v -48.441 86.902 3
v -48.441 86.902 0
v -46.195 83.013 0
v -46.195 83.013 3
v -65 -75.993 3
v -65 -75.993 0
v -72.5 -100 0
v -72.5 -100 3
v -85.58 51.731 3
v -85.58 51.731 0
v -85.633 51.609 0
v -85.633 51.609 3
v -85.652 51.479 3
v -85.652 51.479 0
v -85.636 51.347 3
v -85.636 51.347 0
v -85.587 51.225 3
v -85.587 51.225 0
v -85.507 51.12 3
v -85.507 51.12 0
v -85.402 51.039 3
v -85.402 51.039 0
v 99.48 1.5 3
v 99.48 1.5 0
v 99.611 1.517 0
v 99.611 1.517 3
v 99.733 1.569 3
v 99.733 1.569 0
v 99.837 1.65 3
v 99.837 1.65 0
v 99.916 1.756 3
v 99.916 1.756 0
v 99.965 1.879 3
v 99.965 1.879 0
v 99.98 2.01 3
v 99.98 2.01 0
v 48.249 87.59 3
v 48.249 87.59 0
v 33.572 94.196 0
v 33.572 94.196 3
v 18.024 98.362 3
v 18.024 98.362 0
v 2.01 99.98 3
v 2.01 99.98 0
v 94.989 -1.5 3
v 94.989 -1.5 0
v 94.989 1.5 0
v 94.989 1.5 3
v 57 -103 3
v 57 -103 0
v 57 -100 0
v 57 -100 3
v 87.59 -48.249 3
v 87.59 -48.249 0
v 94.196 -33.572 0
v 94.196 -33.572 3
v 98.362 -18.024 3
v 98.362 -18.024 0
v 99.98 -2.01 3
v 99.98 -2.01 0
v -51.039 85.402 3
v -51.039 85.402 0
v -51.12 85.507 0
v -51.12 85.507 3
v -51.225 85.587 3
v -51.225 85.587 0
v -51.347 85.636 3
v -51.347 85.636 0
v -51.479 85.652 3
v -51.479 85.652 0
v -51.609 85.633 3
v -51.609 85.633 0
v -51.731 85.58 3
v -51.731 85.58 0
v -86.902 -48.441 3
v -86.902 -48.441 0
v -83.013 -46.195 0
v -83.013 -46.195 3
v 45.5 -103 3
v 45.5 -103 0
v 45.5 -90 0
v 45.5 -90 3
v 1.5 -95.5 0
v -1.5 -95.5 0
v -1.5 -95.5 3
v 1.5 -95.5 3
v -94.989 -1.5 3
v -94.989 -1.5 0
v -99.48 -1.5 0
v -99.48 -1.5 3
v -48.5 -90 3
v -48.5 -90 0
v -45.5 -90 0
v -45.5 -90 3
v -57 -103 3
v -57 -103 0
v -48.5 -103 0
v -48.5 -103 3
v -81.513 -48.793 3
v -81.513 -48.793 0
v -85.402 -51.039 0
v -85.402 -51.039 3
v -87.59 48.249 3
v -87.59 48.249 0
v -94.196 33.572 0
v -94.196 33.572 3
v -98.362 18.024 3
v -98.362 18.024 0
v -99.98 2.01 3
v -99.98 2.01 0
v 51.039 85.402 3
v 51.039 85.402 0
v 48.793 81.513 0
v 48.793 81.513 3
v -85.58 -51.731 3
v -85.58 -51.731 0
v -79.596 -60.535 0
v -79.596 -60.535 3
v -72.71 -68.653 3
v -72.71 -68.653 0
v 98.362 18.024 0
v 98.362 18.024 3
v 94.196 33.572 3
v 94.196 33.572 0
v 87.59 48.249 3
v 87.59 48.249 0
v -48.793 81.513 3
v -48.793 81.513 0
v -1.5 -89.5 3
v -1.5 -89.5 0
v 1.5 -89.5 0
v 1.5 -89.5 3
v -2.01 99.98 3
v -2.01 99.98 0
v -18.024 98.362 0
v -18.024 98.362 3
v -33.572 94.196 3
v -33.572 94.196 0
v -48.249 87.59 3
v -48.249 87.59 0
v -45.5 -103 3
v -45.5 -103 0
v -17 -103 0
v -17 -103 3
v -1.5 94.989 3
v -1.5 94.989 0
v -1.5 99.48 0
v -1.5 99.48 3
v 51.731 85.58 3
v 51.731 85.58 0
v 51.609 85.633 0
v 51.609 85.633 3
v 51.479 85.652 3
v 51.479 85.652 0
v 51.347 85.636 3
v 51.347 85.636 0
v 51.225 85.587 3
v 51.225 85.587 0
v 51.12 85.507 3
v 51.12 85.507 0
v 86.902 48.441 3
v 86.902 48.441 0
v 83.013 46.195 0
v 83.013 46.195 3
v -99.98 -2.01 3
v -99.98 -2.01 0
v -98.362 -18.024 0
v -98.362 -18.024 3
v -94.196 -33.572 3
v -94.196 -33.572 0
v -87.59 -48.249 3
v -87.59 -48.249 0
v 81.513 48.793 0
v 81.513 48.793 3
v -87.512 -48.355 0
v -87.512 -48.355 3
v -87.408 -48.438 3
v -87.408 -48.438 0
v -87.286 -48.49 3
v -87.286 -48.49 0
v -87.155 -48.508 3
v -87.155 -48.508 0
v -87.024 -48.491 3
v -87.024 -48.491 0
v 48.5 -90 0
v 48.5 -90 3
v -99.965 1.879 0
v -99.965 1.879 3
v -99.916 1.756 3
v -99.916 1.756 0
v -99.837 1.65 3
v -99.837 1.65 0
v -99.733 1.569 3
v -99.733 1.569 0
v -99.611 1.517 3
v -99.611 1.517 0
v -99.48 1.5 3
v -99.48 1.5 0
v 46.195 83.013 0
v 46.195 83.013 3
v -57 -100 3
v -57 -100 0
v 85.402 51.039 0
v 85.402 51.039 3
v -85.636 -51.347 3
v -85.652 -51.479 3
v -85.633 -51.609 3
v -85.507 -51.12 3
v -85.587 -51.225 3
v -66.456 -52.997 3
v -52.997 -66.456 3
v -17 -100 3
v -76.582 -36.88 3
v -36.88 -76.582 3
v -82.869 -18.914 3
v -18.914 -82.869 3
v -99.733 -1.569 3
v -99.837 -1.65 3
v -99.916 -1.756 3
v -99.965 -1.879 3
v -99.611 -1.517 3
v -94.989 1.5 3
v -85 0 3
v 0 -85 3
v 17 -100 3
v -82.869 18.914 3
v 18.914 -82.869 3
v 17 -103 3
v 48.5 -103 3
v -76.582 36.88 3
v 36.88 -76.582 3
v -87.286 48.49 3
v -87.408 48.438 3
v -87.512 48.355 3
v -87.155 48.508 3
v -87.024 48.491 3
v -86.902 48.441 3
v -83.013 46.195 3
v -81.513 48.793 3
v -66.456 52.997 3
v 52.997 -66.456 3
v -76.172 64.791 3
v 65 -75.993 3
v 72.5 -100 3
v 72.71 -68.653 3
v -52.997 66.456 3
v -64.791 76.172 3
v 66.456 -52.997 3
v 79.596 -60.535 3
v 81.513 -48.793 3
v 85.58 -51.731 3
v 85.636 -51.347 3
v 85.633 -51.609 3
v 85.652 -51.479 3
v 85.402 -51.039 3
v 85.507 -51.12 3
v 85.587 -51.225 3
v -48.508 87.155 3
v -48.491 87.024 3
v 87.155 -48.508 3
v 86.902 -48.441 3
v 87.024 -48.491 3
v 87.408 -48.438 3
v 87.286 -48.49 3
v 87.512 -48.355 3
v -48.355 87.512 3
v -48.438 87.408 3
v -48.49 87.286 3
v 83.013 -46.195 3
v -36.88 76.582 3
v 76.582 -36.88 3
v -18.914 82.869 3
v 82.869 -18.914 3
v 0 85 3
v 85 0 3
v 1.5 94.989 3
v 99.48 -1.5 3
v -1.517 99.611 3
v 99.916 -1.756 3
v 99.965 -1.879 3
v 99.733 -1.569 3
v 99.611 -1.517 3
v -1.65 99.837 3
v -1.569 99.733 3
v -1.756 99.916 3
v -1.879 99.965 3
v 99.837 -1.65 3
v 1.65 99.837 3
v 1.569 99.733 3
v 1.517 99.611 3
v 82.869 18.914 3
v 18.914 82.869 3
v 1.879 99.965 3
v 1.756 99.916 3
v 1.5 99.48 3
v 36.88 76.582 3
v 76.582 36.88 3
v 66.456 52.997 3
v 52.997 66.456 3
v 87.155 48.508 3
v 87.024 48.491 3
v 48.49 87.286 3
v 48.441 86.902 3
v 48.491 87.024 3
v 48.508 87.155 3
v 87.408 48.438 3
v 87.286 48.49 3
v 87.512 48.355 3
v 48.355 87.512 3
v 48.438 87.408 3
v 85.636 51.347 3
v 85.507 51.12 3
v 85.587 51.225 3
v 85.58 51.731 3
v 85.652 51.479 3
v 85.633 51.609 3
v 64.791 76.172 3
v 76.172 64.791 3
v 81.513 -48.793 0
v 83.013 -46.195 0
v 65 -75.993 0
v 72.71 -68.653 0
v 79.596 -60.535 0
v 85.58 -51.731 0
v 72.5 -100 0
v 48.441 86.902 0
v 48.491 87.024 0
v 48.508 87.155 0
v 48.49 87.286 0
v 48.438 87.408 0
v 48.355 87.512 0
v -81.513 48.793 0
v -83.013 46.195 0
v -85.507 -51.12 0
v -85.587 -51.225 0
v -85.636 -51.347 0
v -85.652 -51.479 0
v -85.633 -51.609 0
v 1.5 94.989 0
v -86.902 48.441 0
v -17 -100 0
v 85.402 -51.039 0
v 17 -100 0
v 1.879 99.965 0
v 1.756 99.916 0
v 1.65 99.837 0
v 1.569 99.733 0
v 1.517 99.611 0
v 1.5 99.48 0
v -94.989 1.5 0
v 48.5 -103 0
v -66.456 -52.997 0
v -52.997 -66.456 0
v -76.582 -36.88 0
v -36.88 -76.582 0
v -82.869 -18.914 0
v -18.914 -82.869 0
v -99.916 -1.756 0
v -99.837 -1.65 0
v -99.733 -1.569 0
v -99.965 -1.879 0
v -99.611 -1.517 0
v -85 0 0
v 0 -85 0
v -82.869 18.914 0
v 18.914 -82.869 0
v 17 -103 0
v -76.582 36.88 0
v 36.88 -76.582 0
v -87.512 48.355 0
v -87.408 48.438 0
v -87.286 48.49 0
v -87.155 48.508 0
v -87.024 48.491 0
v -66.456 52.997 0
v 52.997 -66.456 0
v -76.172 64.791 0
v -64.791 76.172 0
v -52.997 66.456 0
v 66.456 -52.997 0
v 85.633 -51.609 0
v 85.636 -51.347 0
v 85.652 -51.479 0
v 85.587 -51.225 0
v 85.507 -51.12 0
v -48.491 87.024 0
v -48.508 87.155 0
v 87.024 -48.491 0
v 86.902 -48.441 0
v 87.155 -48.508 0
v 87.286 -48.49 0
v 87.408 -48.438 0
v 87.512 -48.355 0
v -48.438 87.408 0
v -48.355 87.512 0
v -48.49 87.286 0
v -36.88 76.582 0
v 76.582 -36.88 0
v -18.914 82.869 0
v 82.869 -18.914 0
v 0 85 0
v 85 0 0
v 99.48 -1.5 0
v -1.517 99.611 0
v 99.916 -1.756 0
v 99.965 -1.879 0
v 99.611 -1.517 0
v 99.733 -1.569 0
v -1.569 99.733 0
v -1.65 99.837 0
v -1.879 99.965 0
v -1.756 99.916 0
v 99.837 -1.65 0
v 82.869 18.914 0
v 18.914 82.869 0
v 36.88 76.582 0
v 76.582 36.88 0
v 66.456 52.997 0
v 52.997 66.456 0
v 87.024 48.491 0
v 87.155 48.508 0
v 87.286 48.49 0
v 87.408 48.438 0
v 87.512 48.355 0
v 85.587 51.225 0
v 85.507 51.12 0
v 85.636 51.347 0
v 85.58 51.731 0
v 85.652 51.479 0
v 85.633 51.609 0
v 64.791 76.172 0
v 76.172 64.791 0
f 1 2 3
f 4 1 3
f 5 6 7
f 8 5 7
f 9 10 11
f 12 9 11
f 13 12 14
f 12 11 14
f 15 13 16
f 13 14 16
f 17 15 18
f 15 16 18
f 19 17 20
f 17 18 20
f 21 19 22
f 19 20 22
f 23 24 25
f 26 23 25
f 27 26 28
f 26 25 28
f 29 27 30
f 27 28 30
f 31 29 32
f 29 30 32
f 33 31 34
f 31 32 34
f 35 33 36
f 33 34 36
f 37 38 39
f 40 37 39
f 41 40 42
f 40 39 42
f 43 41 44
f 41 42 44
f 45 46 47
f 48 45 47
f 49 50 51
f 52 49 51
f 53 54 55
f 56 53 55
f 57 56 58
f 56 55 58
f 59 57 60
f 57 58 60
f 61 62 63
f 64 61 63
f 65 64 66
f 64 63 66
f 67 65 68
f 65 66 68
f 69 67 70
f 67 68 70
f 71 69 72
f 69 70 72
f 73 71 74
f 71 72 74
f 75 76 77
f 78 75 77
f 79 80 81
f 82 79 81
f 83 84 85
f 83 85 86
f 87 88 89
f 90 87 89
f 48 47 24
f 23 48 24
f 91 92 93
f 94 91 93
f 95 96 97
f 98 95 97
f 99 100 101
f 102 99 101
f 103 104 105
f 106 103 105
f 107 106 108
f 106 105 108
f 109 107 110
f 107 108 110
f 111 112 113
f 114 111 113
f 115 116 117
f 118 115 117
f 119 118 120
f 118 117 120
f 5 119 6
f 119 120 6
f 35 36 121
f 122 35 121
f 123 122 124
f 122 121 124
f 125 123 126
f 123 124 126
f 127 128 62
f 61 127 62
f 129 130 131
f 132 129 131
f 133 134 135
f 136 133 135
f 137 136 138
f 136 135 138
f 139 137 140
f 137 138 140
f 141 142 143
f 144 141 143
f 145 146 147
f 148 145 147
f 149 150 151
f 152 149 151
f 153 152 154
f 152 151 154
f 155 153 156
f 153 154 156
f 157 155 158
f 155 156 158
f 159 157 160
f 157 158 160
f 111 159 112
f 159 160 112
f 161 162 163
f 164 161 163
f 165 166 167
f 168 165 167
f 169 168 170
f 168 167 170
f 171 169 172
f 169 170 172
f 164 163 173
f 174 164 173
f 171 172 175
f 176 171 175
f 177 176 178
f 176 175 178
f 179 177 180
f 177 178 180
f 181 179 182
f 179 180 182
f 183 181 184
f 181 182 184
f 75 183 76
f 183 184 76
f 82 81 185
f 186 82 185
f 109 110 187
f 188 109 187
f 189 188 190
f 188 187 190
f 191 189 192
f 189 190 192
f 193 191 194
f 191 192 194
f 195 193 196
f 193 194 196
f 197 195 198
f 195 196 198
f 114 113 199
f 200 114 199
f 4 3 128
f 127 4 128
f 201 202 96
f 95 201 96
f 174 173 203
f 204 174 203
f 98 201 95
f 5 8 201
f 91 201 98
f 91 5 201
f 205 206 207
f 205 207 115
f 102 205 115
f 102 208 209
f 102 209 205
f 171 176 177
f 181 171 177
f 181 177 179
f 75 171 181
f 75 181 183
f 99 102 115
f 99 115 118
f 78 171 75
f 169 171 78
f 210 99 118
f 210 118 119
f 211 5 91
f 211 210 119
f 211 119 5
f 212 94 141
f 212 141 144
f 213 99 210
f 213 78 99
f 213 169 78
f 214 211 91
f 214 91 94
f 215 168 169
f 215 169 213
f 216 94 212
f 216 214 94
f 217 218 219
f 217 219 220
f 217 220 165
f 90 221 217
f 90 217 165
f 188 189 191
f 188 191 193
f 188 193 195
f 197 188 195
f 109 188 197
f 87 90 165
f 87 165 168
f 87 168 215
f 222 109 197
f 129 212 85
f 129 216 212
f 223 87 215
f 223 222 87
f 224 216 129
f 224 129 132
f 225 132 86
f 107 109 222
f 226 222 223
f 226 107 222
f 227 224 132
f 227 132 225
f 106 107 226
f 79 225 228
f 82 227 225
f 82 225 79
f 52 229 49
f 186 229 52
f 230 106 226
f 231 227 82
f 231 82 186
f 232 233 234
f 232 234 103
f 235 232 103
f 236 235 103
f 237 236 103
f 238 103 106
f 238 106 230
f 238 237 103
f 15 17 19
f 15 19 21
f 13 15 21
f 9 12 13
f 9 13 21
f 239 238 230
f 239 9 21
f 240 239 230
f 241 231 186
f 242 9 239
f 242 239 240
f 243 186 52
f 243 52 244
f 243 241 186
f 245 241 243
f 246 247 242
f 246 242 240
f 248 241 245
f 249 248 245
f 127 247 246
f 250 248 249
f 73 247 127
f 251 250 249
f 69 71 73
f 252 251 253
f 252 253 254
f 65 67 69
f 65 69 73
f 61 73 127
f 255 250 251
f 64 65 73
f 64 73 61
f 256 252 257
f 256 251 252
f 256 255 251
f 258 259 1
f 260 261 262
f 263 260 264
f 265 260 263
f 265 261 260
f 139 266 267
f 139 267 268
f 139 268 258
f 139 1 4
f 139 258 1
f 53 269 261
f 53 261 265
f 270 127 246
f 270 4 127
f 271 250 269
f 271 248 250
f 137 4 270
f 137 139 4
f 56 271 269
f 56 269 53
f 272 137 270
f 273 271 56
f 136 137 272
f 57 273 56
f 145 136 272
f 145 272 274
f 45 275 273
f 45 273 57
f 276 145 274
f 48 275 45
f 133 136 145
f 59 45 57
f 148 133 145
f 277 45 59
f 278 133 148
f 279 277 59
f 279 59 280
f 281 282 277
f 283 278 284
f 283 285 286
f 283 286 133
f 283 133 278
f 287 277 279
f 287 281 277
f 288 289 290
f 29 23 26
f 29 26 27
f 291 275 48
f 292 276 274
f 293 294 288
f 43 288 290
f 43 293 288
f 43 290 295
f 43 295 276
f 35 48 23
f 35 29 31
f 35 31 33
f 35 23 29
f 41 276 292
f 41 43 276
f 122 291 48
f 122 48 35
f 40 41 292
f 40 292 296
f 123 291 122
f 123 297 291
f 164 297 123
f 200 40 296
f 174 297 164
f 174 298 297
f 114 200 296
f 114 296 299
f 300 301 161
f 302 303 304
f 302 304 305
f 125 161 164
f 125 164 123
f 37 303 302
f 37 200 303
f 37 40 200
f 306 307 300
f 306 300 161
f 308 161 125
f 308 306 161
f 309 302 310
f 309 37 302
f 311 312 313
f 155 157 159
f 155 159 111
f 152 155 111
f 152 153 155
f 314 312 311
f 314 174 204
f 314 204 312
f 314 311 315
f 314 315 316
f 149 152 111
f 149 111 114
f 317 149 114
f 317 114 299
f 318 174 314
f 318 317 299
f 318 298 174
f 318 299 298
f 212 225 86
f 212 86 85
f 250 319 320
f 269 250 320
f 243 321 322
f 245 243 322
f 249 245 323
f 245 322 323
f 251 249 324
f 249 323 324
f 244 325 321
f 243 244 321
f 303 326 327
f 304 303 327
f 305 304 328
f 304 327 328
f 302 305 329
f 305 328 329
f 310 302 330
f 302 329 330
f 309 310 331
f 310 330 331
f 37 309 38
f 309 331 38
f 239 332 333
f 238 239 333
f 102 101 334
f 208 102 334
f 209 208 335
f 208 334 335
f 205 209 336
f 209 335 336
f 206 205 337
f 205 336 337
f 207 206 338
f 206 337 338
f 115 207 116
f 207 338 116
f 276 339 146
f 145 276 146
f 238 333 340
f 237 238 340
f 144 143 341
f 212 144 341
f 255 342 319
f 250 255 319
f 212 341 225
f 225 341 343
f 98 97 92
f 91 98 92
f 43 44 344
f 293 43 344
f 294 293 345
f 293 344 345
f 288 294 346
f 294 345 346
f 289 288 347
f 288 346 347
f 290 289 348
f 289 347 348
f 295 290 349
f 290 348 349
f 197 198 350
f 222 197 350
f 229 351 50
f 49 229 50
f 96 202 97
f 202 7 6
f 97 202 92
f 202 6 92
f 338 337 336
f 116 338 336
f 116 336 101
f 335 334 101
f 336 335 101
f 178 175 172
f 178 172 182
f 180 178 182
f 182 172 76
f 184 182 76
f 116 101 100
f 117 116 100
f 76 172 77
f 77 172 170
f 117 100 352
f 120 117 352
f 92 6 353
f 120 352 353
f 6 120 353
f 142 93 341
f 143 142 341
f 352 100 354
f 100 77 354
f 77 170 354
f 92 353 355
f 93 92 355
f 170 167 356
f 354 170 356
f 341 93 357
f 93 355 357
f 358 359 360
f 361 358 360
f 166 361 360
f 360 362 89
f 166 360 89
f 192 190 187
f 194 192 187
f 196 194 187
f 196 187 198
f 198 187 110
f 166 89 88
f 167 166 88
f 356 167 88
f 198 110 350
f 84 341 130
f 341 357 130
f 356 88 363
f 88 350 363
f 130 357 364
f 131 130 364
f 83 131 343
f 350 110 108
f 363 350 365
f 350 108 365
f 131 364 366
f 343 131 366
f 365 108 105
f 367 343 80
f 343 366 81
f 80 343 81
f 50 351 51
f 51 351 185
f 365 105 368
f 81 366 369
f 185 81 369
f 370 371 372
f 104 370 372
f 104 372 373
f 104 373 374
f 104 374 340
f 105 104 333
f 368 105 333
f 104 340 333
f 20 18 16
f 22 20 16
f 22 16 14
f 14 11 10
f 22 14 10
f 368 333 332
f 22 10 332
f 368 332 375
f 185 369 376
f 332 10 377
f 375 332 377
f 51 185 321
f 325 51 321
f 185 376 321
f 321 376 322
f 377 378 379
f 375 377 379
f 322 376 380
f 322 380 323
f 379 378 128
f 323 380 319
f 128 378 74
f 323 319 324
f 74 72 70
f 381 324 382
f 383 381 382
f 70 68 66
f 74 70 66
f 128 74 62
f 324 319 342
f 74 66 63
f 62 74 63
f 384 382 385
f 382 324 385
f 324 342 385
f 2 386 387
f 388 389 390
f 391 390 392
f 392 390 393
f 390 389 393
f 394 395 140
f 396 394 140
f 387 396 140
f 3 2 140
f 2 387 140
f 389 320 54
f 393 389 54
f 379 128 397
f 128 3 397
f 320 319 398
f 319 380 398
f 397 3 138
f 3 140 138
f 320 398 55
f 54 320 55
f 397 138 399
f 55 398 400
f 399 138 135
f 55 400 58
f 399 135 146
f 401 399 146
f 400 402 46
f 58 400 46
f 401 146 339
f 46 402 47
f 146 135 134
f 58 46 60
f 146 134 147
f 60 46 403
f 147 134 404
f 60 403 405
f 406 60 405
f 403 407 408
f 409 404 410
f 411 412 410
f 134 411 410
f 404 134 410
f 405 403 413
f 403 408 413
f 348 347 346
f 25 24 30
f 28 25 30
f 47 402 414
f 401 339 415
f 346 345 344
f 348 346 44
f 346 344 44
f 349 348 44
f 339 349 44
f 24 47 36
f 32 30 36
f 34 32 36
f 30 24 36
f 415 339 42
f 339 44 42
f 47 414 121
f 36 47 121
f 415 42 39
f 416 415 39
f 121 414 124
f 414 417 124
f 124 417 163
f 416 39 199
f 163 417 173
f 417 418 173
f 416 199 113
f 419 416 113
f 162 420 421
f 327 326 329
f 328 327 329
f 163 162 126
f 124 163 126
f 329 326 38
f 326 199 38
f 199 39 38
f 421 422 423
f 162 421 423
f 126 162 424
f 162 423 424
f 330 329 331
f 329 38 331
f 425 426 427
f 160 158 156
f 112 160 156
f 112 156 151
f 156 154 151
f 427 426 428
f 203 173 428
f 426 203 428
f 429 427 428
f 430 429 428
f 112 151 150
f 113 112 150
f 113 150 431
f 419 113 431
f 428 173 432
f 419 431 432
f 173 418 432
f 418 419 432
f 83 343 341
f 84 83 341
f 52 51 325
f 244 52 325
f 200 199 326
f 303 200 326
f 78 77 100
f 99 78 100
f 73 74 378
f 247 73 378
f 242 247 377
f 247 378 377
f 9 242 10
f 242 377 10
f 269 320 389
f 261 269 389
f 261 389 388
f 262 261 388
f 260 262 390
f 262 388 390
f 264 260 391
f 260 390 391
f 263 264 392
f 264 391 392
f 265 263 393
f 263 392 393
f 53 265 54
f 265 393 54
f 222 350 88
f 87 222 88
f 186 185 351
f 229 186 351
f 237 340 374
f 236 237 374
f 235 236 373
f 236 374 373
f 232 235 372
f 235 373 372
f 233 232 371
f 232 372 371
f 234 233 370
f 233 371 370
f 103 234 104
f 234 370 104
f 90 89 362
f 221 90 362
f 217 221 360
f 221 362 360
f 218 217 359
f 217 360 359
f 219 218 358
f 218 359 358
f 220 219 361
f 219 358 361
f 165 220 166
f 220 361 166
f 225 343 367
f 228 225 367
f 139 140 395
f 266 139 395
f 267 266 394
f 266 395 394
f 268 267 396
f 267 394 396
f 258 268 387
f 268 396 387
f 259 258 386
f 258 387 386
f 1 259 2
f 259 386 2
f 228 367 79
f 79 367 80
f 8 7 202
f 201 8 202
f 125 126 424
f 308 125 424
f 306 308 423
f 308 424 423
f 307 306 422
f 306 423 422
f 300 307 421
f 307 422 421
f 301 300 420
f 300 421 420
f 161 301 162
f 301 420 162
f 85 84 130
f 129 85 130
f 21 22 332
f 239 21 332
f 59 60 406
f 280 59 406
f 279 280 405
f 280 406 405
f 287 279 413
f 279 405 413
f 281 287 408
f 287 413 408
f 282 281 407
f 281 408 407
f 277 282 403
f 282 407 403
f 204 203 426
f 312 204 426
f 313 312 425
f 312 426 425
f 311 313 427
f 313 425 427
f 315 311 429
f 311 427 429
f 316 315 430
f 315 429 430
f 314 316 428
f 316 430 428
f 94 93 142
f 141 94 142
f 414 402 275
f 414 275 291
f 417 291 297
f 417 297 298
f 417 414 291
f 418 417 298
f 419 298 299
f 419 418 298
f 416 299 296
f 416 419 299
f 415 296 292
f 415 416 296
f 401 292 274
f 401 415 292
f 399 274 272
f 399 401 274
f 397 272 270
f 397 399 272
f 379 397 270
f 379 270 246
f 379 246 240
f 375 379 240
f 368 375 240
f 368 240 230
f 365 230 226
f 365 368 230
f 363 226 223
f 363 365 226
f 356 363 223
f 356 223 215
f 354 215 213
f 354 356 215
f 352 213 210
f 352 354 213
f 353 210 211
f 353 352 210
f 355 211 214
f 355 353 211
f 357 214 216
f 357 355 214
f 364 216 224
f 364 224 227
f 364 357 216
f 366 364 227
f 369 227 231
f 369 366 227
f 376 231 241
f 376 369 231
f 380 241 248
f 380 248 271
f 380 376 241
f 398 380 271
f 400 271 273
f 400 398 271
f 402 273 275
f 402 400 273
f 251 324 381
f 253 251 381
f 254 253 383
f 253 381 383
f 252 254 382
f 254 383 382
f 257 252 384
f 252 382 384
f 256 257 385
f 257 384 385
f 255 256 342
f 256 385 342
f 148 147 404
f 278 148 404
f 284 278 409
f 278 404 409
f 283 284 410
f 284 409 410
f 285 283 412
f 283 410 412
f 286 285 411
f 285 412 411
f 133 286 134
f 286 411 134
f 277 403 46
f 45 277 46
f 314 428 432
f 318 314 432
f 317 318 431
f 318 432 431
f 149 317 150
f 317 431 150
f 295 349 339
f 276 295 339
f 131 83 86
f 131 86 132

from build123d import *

# Parameters (mm, degrees)
F0_W     = 3
F0_H     = 6
F0_R     = 85
F1_DEPTH = 3


with BuildPart() as f1:
    # F0 (on Top) → F1 (new body)
    with BuildSketch(Plane.XY):
        with BuildLine():
            ThreePointArc((-1.5, 99.479897), (-1.650018, 99.836986), (-2.01005, 99.979796))
            ThreePointArc((-2.01005, 99.979796), (-25.881905, 96.592583), (-48.249144, 87.590069))
            ThreePointArc((-48.249144, 87.590069), (-48.489536, 87.286376), (-48.440911, 86.902118))
            Line((-48.440911, 86.902118), (-46.195337, 83.01267))
            Line((-46.195337, 83.01267), (-48.793413, 81.51267))
            Line((-48.793413, 81.51267), (-51.038987, 85.402118))
            ThreePointArc((-51.038987, 85.402118), (-51.347451, 85.636358), (-51.730653, 85.580018))
            ThreePointArc((-51.730653, 85.580018), (-70.710678, 70.710678), (-85.580018, 51.730653))
            ThreePointArc((-85.580018, 51.730653), (-85.636358, 51.347451), (-85.402118, 51.038987))
            Line((-85.402118, 51.038987), (-81.51267, 48.793413))
            Line((-81.51267, 48.793413), (-83.01267, 46.195337))
            Line((-83.01267, 46.195337), (-86.902118, 48.440911))
            ThreePointArc((-86.902118, 48.440911), (-87.286376, 48.489536), (-87.590069, 48.249144))
            ThreePointArc((-87.590069, 48.249144), (-96.592583, 25.881905), (-99.979796, 2.01005))
            ThreePointArc((-99.979796, 2.01005), (-99.836986, 1.650018), (-99.479897, 1.5))
            Line((-99.479897, 1.5), (-94.988749, 1.5))
            Line((-94.988749, 1.5), (-94.988749, -1.5))
            Line((-94.988749, -1.5), (-99.479897, -1.5))
            ThreePointArc((-99.479897, -1.5), (-99.836986, -1.650018), (-99.979796, -2.01005))
            ThreePointArc((-99.979796, -2.01005), (-96.592583, -25.881905), (-87.590069, -48.249144))
            ThreePointArc((-87.590069, -48.249144), (-87.286376, -48.489536), (-86.902118, -48.440911))
            Line((-86.902118, -48.440911), (-83.01267, -46.195337))
            Line((-83.01267, -46.195337), (-81.51267, -48.793413))
            Line((-81.51267, -48.793413), (-85.402118, -51.038987))
            ThreePointArc((-85.402118, -51.038987), (-85.636358, -51.347451), (-85.580018, -51.730653))
            ThreePointArc((-85.580018, -51.730653), (-76.261104, -64.685733), (-65, -75.993421))
            Line((-65, -75.993421), (-72.5, -100))
            Line((-72.5, -100), (-57, -100))
            Line((-57, -100), (-57, -103))
            Line((-57, -103), (-48.5, -103))
            Line((-48.5, -103), (-48.5, -90))
            Line((-48.5, -90), (-45.5, -90))
            Line((-45.5, -90), (-45.5, -103))
            Line((-45.5, -103), (-17, -103))
            Line((-17, -103), (-17, -100))
            Line((-17, -100), (17, -100))
            Line((17, -100), (17, -103))
            Line((17, -103), (45.5, -103))
            Line((45.5, -103), (45.5, -90))
            Line((45.5, -90), (48.5, -90))
            Line((48.5, -90), (48.5, -103))
            Line((48.5, -103), (57, -103))
            Line((57, -103), (57, -100))
            Line((57, -100), (72.5, -100))
            Line((72.5, -100), (65, -75.993421))
            ThreePointArc((65, -75.993421), (76.261104, -64.685733), (85.580018, -51.730653))
            ThreePointArc((85.580018, -51.730653), (85.636358, -51.347451), (85.402118, -51.038987))
            Line((85.402118, -51.038987), (81.51267, -48.793413))
            Line((81.51267, -48.793413), (83.01267, -46.195337))
            Line((83.01267, -46.195337), (86.902118, -48.440911))
            ThreePointArc((86.902118, -48.440911), (87.286376, -48.489536), (87.590069, -48.249144))
            ThreePointArc((87.590069, -48.249144), (96.592583, -25.881905), (99.979796, -2.01005))
            ThreePointArc((99.979796, -2.01005), (99.836986, -1.650018), (99.479897, -1.5))
            Line((99.479897, -1.5), (94.988749, -1.5))
            Line((94.988749, -1.5), (94.988749, 1.5))
            Line((94.988749, 1.5), (99.479897, 1.5))
            ThreePointArc((99.479897, 1.5), (99.836986, 1.650018), (99.979796, 2.01005))
            ThreePointArc((99.979796, 2.01005), (96.592583, 25.881905), (87.590069, 48.249144))
            ThreePointArc((87.590069, 48.249144), (87.286376, 48.489536), (86.902118, 48.440911))
            Line((86.902118, 48.440911), (83.01267, 46.195337))
            Line((83.01267, 46.195337), (81.51267, 48.793413))
            Line((81.51267, 48.793413), (85.402118, 51.038987))
            ThreePointArc((85.402118, 51.038987), (85.636358, 51.347451), (85.580018, 51.730653))
            ThreePointArc((85.580018, 51.730653), (70.710678, 70.710678), (51.730653, 85.580018))
            ThreePointArc((51.730653, 85.580018), (51.347451, 85.636358), (51.038987, 85.402118))
            Line((51.038987, 85.402118), (48.793413, 81.51267))
            Line((48.793413, 81.51267), (46.195337, 83.01267))
            Line((46.195337, 83.01267), (48.440911, 86.902118))
            ThreePointArc((48.440911, 86.902118), (48.489536, 87.286376), (48.249144, 87.590069))
            ThreePointArc((48.249144, 87.590069), (25.881905, 96.592583), (2.01005, 99.979796))
            ThreePointArc((2.01005, 99.979796), (1.650018, 99.836986), (1.5, 99.479897))
            Line((1.5, 99.479897), (1.5, 94.988749))
            Line((1.5, 94.988749), (-1.5, 94.988749))
            Line((-1.5, 94.988749), (-1.5, 99.479897))
        make_face()
        with Locations((0, -92.5)):
            Rectangle(F0_W, F0_H, mode=Mode.SUBTRACT)
        Circle(F0_R, mode=Mode.SUBTRACT)
    extrude(amount=F1_DEPTH)


solid = f1.part
